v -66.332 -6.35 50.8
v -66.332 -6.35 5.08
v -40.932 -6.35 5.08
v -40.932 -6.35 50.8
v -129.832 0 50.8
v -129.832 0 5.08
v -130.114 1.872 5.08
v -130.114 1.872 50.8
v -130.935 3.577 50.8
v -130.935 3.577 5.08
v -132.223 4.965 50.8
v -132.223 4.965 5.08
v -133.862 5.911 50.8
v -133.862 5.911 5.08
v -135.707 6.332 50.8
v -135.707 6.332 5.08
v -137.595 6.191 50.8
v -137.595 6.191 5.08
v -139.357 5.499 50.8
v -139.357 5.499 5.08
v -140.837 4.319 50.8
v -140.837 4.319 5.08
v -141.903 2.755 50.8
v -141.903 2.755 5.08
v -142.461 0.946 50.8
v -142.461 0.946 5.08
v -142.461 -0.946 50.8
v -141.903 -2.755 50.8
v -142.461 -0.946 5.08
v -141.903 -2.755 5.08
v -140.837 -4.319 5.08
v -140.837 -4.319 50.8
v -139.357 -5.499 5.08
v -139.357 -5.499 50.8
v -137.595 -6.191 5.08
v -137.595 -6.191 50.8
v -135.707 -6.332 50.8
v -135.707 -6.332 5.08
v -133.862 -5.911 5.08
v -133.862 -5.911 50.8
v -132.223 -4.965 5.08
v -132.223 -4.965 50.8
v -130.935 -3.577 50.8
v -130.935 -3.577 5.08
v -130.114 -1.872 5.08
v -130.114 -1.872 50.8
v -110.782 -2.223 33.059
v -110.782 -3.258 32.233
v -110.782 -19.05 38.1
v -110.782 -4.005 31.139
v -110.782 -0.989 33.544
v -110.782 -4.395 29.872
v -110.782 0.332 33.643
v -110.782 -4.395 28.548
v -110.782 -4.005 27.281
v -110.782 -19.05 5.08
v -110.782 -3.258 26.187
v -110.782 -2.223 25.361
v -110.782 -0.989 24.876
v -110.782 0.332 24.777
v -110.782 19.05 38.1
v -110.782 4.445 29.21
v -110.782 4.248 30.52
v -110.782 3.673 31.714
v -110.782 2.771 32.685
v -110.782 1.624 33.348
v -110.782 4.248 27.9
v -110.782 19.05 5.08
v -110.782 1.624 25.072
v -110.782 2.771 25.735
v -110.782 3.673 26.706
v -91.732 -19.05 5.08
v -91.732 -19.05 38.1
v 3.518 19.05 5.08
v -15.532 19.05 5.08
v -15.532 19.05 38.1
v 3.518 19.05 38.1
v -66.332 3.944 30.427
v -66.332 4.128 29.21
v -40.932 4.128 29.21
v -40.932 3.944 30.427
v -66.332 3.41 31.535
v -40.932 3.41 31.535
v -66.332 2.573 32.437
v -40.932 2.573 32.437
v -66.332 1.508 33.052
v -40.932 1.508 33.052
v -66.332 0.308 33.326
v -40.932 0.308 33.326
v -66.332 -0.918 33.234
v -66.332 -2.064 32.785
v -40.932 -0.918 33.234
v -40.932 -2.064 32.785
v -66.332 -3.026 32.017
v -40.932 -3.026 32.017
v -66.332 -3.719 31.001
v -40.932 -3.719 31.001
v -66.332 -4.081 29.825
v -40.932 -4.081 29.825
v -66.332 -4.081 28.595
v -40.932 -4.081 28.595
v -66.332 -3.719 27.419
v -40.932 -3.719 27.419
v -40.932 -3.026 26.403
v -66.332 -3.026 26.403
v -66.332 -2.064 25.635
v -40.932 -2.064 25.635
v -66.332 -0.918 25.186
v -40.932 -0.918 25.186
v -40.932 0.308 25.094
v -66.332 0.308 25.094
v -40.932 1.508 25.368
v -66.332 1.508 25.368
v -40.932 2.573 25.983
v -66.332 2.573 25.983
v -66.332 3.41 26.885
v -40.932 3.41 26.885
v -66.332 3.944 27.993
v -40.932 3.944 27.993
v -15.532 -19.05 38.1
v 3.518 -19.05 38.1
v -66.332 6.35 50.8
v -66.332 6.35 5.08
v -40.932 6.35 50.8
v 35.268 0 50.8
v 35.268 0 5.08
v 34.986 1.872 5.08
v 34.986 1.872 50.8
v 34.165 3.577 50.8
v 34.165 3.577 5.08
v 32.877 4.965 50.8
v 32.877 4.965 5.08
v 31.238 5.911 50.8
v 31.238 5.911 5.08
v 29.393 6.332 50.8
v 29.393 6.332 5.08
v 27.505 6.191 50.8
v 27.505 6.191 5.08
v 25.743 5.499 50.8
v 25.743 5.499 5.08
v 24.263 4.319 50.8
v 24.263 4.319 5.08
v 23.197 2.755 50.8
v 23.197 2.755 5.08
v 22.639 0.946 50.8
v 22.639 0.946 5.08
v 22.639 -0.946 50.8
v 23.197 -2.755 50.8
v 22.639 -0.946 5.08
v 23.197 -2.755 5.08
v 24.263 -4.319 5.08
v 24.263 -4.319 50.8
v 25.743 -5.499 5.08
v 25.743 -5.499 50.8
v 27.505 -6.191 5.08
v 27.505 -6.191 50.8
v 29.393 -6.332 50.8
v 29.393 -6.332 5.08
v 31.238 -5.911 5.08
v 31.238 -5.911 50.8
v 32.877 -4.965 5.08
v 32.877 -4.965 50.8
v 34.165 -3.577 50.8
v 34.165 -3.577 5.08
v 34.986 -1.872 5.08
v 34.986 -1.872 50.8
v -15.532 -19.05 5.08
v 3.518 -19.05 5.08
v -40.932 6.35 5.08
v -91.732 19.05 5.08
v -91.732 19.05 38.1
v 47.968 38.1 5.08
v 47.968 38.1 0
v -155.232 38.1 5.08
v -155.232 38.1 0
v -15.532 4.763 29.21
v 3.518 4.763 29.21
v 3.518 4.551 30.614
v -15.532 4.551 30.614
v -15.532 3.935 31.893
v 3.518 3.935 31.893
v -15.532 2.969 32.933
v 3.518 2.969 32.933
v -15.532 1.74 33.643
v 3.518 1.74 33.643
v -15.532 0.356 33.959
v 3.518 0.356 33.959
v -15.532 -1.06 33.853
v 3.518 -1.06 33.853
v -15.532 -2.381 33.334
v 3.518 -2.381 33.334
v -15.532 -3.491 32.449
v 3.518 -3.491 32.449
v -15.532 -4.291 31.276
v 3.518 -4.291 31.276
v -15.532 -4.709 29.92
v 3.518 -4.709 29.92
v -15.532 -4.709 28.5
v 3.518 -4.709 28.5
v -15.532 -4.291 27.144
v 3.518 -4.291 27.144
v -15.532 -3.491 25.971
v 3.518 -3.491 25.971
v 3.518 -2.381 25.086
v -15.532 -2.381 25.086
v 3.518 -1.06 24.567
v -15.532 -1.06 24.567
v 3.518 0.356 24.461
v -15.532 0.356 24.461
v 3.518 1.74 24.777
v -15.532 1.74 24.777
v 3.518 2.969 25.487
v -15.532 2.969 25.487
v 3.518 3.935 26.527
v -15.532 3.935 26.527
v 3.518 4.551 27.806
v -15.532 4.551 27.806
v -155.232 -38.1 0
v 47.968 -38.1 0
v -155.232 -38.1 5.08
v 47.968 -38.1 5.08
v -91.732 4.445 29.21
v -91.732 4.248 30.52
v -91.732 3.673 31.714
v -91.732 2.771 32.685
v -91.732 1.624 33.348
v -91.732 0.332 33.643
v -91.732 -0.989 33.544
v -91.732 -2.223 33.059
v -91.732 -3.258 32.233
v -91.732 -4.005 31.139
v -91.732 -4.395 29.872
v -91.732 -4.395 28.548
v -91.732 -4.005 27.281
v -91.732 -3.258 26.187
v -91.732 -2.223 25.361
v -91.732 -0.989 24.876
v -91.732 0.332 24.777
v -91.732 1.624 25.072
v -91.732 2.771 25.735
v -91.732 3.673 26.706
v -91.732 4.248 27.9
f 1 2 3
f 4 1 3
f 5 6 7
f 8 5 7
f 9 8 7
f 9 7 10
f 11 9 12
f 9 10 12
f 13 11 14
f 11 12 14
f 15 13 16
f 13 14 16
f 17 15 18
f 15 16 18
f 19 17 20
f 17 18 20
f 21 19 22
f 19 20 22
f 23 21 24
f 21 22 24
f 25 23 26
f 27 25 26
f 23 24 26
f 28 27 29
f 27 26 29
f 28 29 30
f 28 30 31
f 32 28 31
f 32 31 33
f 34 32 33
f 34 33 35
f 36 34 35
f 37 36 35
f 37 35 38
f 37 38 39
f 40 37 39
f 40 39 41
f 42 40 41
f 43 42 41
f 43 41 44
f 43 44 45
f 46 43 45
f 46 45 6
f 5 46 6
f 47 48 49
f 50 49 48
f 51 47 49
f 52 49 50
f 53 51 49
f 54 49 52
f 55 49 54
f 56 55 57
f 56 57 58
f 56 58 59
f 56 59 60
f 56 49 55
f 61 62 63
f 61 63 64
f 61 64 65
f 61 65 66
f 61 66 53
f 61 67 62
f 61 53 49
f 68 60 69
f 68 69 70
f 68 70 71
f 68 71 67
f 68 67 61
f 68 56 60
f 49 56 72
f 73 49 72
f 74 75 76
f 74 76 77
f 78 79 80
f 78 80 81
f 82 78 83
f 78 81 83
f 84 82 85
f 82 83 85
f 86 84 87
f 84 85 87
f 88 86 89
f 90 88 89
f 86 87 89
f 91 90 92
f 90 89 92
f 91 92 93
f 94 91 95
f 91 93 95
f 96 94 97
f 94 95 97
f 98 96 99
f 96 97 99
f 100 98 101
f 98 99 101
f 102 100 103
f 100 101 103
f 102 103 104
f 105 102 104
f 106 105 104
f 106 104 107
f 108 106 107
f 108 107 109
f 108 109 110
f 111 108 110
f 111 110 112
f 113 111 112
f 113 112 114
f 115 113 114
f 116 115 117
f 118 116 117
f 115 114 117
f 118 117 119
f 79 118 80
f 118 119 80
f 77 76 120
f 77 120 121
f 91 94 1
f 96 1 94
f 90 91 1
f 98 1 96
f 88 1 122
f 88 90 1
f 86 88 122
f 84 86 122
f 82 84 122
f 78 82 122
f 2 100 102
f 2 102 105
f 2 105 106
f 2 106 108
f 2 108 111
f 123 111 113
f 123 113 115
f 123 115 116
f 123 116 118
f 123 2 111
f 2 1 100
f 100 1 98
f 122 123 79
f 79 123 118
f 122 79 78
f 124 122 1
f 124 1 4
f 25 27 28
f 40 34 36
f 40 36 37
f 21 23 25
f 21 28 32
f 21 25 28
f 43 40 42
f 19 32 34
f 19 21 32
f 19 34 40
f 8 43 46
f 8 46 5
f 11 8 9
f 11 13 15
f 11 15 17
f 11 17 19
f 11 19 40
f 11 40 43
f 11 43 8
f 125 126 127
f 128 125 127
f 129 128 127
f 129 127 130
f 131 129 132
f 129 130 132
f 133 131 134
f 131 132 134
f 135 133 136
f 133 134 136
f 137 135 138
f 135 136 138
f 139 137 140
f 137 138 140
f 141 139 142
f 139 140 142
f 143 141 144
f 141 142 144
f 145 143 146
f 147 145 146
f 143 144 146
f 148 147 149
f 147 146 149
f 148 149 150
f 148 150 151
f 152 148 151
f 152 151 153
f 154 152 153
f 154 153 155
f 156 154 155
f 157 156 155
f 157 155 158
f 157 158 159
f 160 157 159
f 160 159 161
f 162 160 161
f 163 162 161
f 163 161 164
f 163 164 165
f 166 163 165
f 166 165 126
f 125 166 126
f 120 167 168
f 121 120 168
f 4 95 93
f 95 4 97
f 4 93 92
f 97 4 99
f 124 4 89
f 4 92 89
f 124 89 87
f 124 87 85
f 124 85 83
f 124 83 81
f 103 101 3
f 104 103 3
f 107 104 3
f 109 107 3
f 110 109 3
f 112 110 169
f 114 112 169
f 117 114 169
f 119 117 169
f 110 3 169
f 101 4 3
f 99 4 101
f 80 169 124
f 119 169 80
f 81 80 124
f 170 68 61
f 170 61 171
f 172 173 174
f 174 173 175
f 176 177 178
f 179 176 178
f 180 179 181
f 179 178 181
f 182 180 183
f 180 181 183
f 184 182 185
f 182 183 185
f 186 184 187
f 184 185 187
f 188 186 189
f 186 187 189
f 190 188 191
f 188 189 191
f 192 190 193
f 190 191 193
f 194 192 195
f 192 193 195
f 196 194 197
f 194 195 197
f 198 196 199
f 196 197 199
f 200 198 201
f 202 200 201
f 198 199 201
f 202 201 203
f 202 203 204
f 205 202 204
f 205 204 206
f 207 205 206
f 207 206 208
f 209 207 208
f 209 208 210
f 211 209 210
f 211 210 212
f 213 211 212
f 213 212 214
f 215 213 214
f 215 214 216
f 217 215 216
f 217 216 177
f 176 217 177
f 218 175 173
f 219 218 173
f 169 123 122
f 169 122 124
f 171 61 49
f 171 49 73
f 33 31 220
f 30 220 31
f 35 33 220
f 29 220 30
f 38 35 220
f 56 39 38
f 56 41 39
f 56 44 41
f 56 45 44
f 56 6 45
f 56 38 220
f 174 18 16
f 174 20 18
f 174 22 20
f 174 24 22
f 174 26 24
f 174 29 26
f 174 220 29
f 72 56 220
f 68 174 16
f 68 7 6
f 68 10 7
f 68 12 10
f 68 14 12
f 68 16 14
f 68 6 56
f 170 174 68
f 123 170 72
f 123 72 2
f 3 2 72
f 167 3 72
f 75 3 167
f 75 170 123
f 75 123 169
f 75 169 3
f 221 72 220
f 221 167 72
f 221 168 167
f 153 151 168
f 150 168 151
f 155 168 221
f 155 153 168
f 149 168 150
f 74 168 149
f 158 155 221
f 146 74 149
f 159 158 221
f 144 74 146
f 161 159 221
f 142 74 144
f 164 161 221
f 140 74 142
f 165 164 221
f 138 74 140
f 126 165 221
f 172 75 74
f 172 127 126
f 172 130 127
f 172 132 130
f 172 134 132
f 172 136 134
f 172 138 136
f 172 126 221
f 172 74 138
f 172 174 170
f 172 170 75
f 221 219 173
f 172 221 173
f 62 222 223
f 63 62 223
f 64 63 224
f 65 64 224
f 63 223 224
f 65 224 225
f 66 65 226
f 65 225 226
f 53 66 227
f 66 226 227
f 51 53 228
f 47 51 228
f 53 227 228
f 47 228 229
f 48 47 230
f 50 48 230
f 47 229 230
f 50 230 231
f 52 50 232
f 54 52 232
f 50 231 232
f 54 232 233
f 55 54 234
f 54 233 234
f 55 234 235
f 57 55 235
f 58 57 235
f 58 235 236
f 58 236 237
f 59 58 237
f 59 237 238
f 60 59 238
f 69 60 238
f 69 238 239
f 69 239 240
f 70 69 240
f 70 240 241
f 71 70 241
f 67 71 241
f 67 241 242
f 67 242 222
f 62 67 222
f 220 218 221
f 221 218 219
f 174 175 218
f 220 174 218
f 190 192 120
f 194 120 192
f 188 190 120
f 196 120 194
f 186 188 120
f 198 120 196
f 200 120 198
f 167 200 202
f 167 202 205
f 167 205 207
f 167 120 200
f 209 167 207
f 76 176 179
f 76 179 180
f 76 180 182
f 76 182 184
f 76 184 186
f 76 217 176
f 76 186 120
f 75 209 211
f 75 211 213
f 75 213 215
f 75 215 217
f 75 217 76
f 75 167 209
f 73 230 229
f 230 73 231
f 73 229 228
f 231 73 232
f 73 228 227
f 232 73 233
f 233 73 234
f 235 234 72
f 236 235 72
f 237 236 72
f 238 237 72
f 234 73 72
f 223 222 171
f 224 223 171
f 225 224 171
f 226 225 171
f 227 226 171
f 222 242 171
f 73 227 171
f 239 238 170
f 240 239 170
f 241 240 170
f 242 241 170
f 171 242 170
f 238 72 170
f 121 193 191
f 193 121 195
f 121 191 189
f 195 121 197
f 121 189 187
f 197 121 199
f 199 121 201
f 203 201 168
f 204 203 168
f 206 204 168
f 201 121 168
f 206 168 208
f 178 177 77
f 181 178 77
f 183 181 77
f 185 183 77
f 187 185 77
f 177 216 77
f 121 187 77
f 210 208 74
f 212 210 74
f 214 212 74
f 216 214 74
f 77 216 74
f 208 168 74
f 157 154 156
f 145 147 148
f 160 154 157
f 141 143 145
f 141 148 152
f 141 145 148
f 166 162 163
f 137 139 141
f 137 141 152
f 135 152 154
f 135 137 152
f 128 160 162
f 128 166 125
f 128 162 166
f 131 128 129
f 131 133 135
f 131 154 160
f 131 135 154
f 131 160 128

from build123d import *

# Parameters (mm, degrees)
F0_W     = 25.4
F0_H     = 12.7
F1_DEPTH = 50.8
F0_R     = 6.35
F0_W_2   = 19.05
F0_H_2   = 38.1
F2_DEPTH = 38.1
F3_DEPTH = 5.08
F5_DEPTH = 25.4
F6_R     = 4.1275
F7_DEPTH = 25.4
F8_R     = 4.445
F9_DEPTH = 25.4


with BuildPart() as f1:
    # F0 (on Top) → F1 (new body)
    with BuildSketch(Plane.XY):
        with Locations((-53.6319812462, 0)):
            Rectangle(F0_W, F0_H)
    extrude(amount=F1_DEPTH)



with BuildPart() as f1b:
    # F0 (on Top) → F1, piece 2 (new body)
    with BuildSketch(Plane.XY):
        with Locations((28.9180187538, 0)):
            Circle(F0_R)
    extrude(amount=F1_DEPTH)


with BuildPart() as f1c:
    # F0 (on Top) → F1, piece 3 (new body)
    with BuildSketch(Plane.XY):
        with Locations((-136.1819812462, 0)):
            Circle(F0_R)
    extrude(amount=F1_DEPTH)


with BuildPart() as f2:
    # F0 (on Top) → F2 (new body)
    with BuildSketch(Plane.XY):
        with Locations((-101.2569812462, 0)):
            Rectangle(F0_W_2, F0_H_2)
    extrude(amount=F2_DEPTH)


with BuildPart() as f2b:
    # F0 (on Top) → F2, piece 2 (new body)
    with BuildSketch(Plane.XY):
        with Locations((-6.0069812462, 0)):
            Rectangle(F0_W_2, F0_H_2)
    extrude(amount=F2_DEPTH)


with BuildPart() as f1_1:
    add(f1.part)

    add(f1b.part)  # F3 merges F1b

    add(f1c.part)  # F3 merges F1c

    add(f2.part)  # F3 merges F2

    add(f2b.part)  # F3 merges F2b
    # F0 (on Top) → F3 (join)
    with BuildSketch(Plane.XY):
        Polygon((47.9680187538, 38.1), (-155.2319812462, 38.1), (-155.2319812462, -38.1), (47.9680187538, -38.1), (47.9680187538, 0), align=None)
        with Locations((-136.1819812462, 0)):
            Circle(F0_R, mode=Mode.SUBTRACT)
        with Locations((-101.2569812462, 0)):
            Rectangle(F0_W_2, F0_H_2, mode=Mode.SUBTRACT)
        with Locations((-53.6319812462, 0)):
            Rectangle(F0_W, F0_H, mode=Mode.SUBTRACT)
        with Locations((-6.0069812462, 0)):
            Rectangle(F0_W_2, F0_H_2, mode=Mode.SUBTRACT)
        with Locations((28.9180187538, 0)):
            Circle(F0_R, mode=Mode.SUBTRACT)
    extrude(amount=F3_DEPTH)

    # F4 (on face) → F5 (cut)
    with BuildSketch(Plane.YZ.offset(3.5180187538)):
        with BuildLine():
            ThreePointArc((0, 33.9725), (-3.3675960454, 25.8424039546), (4.7625, 29.21))
            ThreePointArc((4.7625, 29.21), (3.3675960454, 32.5775960454), (0, 33.9725))
        make_face()
    extrude(amount=-F5_DEPTH, mode=Mode.SUBTRACT)

    # F6 (on face) → F7 (cut)
    with BuildSketch(Plane.YZ.offset(-40.9319812462)):
        with Locations((0, 29.21)):
            Circle(F6_R)
    extrude(amount=-F7_DEPTH, mode=Mode.SUBTRACT)

    # F8 (on face) → F9 (cut)
    with BuildSketch(Plane.YZ.offset(-91.7319812462)):
        with Locations((0, 29.21)):
            Circle(F8_R)
    extrude(amount=-F9_DEPTH, mode=Mode.SUBTRACT)


solid = f1_1.part
